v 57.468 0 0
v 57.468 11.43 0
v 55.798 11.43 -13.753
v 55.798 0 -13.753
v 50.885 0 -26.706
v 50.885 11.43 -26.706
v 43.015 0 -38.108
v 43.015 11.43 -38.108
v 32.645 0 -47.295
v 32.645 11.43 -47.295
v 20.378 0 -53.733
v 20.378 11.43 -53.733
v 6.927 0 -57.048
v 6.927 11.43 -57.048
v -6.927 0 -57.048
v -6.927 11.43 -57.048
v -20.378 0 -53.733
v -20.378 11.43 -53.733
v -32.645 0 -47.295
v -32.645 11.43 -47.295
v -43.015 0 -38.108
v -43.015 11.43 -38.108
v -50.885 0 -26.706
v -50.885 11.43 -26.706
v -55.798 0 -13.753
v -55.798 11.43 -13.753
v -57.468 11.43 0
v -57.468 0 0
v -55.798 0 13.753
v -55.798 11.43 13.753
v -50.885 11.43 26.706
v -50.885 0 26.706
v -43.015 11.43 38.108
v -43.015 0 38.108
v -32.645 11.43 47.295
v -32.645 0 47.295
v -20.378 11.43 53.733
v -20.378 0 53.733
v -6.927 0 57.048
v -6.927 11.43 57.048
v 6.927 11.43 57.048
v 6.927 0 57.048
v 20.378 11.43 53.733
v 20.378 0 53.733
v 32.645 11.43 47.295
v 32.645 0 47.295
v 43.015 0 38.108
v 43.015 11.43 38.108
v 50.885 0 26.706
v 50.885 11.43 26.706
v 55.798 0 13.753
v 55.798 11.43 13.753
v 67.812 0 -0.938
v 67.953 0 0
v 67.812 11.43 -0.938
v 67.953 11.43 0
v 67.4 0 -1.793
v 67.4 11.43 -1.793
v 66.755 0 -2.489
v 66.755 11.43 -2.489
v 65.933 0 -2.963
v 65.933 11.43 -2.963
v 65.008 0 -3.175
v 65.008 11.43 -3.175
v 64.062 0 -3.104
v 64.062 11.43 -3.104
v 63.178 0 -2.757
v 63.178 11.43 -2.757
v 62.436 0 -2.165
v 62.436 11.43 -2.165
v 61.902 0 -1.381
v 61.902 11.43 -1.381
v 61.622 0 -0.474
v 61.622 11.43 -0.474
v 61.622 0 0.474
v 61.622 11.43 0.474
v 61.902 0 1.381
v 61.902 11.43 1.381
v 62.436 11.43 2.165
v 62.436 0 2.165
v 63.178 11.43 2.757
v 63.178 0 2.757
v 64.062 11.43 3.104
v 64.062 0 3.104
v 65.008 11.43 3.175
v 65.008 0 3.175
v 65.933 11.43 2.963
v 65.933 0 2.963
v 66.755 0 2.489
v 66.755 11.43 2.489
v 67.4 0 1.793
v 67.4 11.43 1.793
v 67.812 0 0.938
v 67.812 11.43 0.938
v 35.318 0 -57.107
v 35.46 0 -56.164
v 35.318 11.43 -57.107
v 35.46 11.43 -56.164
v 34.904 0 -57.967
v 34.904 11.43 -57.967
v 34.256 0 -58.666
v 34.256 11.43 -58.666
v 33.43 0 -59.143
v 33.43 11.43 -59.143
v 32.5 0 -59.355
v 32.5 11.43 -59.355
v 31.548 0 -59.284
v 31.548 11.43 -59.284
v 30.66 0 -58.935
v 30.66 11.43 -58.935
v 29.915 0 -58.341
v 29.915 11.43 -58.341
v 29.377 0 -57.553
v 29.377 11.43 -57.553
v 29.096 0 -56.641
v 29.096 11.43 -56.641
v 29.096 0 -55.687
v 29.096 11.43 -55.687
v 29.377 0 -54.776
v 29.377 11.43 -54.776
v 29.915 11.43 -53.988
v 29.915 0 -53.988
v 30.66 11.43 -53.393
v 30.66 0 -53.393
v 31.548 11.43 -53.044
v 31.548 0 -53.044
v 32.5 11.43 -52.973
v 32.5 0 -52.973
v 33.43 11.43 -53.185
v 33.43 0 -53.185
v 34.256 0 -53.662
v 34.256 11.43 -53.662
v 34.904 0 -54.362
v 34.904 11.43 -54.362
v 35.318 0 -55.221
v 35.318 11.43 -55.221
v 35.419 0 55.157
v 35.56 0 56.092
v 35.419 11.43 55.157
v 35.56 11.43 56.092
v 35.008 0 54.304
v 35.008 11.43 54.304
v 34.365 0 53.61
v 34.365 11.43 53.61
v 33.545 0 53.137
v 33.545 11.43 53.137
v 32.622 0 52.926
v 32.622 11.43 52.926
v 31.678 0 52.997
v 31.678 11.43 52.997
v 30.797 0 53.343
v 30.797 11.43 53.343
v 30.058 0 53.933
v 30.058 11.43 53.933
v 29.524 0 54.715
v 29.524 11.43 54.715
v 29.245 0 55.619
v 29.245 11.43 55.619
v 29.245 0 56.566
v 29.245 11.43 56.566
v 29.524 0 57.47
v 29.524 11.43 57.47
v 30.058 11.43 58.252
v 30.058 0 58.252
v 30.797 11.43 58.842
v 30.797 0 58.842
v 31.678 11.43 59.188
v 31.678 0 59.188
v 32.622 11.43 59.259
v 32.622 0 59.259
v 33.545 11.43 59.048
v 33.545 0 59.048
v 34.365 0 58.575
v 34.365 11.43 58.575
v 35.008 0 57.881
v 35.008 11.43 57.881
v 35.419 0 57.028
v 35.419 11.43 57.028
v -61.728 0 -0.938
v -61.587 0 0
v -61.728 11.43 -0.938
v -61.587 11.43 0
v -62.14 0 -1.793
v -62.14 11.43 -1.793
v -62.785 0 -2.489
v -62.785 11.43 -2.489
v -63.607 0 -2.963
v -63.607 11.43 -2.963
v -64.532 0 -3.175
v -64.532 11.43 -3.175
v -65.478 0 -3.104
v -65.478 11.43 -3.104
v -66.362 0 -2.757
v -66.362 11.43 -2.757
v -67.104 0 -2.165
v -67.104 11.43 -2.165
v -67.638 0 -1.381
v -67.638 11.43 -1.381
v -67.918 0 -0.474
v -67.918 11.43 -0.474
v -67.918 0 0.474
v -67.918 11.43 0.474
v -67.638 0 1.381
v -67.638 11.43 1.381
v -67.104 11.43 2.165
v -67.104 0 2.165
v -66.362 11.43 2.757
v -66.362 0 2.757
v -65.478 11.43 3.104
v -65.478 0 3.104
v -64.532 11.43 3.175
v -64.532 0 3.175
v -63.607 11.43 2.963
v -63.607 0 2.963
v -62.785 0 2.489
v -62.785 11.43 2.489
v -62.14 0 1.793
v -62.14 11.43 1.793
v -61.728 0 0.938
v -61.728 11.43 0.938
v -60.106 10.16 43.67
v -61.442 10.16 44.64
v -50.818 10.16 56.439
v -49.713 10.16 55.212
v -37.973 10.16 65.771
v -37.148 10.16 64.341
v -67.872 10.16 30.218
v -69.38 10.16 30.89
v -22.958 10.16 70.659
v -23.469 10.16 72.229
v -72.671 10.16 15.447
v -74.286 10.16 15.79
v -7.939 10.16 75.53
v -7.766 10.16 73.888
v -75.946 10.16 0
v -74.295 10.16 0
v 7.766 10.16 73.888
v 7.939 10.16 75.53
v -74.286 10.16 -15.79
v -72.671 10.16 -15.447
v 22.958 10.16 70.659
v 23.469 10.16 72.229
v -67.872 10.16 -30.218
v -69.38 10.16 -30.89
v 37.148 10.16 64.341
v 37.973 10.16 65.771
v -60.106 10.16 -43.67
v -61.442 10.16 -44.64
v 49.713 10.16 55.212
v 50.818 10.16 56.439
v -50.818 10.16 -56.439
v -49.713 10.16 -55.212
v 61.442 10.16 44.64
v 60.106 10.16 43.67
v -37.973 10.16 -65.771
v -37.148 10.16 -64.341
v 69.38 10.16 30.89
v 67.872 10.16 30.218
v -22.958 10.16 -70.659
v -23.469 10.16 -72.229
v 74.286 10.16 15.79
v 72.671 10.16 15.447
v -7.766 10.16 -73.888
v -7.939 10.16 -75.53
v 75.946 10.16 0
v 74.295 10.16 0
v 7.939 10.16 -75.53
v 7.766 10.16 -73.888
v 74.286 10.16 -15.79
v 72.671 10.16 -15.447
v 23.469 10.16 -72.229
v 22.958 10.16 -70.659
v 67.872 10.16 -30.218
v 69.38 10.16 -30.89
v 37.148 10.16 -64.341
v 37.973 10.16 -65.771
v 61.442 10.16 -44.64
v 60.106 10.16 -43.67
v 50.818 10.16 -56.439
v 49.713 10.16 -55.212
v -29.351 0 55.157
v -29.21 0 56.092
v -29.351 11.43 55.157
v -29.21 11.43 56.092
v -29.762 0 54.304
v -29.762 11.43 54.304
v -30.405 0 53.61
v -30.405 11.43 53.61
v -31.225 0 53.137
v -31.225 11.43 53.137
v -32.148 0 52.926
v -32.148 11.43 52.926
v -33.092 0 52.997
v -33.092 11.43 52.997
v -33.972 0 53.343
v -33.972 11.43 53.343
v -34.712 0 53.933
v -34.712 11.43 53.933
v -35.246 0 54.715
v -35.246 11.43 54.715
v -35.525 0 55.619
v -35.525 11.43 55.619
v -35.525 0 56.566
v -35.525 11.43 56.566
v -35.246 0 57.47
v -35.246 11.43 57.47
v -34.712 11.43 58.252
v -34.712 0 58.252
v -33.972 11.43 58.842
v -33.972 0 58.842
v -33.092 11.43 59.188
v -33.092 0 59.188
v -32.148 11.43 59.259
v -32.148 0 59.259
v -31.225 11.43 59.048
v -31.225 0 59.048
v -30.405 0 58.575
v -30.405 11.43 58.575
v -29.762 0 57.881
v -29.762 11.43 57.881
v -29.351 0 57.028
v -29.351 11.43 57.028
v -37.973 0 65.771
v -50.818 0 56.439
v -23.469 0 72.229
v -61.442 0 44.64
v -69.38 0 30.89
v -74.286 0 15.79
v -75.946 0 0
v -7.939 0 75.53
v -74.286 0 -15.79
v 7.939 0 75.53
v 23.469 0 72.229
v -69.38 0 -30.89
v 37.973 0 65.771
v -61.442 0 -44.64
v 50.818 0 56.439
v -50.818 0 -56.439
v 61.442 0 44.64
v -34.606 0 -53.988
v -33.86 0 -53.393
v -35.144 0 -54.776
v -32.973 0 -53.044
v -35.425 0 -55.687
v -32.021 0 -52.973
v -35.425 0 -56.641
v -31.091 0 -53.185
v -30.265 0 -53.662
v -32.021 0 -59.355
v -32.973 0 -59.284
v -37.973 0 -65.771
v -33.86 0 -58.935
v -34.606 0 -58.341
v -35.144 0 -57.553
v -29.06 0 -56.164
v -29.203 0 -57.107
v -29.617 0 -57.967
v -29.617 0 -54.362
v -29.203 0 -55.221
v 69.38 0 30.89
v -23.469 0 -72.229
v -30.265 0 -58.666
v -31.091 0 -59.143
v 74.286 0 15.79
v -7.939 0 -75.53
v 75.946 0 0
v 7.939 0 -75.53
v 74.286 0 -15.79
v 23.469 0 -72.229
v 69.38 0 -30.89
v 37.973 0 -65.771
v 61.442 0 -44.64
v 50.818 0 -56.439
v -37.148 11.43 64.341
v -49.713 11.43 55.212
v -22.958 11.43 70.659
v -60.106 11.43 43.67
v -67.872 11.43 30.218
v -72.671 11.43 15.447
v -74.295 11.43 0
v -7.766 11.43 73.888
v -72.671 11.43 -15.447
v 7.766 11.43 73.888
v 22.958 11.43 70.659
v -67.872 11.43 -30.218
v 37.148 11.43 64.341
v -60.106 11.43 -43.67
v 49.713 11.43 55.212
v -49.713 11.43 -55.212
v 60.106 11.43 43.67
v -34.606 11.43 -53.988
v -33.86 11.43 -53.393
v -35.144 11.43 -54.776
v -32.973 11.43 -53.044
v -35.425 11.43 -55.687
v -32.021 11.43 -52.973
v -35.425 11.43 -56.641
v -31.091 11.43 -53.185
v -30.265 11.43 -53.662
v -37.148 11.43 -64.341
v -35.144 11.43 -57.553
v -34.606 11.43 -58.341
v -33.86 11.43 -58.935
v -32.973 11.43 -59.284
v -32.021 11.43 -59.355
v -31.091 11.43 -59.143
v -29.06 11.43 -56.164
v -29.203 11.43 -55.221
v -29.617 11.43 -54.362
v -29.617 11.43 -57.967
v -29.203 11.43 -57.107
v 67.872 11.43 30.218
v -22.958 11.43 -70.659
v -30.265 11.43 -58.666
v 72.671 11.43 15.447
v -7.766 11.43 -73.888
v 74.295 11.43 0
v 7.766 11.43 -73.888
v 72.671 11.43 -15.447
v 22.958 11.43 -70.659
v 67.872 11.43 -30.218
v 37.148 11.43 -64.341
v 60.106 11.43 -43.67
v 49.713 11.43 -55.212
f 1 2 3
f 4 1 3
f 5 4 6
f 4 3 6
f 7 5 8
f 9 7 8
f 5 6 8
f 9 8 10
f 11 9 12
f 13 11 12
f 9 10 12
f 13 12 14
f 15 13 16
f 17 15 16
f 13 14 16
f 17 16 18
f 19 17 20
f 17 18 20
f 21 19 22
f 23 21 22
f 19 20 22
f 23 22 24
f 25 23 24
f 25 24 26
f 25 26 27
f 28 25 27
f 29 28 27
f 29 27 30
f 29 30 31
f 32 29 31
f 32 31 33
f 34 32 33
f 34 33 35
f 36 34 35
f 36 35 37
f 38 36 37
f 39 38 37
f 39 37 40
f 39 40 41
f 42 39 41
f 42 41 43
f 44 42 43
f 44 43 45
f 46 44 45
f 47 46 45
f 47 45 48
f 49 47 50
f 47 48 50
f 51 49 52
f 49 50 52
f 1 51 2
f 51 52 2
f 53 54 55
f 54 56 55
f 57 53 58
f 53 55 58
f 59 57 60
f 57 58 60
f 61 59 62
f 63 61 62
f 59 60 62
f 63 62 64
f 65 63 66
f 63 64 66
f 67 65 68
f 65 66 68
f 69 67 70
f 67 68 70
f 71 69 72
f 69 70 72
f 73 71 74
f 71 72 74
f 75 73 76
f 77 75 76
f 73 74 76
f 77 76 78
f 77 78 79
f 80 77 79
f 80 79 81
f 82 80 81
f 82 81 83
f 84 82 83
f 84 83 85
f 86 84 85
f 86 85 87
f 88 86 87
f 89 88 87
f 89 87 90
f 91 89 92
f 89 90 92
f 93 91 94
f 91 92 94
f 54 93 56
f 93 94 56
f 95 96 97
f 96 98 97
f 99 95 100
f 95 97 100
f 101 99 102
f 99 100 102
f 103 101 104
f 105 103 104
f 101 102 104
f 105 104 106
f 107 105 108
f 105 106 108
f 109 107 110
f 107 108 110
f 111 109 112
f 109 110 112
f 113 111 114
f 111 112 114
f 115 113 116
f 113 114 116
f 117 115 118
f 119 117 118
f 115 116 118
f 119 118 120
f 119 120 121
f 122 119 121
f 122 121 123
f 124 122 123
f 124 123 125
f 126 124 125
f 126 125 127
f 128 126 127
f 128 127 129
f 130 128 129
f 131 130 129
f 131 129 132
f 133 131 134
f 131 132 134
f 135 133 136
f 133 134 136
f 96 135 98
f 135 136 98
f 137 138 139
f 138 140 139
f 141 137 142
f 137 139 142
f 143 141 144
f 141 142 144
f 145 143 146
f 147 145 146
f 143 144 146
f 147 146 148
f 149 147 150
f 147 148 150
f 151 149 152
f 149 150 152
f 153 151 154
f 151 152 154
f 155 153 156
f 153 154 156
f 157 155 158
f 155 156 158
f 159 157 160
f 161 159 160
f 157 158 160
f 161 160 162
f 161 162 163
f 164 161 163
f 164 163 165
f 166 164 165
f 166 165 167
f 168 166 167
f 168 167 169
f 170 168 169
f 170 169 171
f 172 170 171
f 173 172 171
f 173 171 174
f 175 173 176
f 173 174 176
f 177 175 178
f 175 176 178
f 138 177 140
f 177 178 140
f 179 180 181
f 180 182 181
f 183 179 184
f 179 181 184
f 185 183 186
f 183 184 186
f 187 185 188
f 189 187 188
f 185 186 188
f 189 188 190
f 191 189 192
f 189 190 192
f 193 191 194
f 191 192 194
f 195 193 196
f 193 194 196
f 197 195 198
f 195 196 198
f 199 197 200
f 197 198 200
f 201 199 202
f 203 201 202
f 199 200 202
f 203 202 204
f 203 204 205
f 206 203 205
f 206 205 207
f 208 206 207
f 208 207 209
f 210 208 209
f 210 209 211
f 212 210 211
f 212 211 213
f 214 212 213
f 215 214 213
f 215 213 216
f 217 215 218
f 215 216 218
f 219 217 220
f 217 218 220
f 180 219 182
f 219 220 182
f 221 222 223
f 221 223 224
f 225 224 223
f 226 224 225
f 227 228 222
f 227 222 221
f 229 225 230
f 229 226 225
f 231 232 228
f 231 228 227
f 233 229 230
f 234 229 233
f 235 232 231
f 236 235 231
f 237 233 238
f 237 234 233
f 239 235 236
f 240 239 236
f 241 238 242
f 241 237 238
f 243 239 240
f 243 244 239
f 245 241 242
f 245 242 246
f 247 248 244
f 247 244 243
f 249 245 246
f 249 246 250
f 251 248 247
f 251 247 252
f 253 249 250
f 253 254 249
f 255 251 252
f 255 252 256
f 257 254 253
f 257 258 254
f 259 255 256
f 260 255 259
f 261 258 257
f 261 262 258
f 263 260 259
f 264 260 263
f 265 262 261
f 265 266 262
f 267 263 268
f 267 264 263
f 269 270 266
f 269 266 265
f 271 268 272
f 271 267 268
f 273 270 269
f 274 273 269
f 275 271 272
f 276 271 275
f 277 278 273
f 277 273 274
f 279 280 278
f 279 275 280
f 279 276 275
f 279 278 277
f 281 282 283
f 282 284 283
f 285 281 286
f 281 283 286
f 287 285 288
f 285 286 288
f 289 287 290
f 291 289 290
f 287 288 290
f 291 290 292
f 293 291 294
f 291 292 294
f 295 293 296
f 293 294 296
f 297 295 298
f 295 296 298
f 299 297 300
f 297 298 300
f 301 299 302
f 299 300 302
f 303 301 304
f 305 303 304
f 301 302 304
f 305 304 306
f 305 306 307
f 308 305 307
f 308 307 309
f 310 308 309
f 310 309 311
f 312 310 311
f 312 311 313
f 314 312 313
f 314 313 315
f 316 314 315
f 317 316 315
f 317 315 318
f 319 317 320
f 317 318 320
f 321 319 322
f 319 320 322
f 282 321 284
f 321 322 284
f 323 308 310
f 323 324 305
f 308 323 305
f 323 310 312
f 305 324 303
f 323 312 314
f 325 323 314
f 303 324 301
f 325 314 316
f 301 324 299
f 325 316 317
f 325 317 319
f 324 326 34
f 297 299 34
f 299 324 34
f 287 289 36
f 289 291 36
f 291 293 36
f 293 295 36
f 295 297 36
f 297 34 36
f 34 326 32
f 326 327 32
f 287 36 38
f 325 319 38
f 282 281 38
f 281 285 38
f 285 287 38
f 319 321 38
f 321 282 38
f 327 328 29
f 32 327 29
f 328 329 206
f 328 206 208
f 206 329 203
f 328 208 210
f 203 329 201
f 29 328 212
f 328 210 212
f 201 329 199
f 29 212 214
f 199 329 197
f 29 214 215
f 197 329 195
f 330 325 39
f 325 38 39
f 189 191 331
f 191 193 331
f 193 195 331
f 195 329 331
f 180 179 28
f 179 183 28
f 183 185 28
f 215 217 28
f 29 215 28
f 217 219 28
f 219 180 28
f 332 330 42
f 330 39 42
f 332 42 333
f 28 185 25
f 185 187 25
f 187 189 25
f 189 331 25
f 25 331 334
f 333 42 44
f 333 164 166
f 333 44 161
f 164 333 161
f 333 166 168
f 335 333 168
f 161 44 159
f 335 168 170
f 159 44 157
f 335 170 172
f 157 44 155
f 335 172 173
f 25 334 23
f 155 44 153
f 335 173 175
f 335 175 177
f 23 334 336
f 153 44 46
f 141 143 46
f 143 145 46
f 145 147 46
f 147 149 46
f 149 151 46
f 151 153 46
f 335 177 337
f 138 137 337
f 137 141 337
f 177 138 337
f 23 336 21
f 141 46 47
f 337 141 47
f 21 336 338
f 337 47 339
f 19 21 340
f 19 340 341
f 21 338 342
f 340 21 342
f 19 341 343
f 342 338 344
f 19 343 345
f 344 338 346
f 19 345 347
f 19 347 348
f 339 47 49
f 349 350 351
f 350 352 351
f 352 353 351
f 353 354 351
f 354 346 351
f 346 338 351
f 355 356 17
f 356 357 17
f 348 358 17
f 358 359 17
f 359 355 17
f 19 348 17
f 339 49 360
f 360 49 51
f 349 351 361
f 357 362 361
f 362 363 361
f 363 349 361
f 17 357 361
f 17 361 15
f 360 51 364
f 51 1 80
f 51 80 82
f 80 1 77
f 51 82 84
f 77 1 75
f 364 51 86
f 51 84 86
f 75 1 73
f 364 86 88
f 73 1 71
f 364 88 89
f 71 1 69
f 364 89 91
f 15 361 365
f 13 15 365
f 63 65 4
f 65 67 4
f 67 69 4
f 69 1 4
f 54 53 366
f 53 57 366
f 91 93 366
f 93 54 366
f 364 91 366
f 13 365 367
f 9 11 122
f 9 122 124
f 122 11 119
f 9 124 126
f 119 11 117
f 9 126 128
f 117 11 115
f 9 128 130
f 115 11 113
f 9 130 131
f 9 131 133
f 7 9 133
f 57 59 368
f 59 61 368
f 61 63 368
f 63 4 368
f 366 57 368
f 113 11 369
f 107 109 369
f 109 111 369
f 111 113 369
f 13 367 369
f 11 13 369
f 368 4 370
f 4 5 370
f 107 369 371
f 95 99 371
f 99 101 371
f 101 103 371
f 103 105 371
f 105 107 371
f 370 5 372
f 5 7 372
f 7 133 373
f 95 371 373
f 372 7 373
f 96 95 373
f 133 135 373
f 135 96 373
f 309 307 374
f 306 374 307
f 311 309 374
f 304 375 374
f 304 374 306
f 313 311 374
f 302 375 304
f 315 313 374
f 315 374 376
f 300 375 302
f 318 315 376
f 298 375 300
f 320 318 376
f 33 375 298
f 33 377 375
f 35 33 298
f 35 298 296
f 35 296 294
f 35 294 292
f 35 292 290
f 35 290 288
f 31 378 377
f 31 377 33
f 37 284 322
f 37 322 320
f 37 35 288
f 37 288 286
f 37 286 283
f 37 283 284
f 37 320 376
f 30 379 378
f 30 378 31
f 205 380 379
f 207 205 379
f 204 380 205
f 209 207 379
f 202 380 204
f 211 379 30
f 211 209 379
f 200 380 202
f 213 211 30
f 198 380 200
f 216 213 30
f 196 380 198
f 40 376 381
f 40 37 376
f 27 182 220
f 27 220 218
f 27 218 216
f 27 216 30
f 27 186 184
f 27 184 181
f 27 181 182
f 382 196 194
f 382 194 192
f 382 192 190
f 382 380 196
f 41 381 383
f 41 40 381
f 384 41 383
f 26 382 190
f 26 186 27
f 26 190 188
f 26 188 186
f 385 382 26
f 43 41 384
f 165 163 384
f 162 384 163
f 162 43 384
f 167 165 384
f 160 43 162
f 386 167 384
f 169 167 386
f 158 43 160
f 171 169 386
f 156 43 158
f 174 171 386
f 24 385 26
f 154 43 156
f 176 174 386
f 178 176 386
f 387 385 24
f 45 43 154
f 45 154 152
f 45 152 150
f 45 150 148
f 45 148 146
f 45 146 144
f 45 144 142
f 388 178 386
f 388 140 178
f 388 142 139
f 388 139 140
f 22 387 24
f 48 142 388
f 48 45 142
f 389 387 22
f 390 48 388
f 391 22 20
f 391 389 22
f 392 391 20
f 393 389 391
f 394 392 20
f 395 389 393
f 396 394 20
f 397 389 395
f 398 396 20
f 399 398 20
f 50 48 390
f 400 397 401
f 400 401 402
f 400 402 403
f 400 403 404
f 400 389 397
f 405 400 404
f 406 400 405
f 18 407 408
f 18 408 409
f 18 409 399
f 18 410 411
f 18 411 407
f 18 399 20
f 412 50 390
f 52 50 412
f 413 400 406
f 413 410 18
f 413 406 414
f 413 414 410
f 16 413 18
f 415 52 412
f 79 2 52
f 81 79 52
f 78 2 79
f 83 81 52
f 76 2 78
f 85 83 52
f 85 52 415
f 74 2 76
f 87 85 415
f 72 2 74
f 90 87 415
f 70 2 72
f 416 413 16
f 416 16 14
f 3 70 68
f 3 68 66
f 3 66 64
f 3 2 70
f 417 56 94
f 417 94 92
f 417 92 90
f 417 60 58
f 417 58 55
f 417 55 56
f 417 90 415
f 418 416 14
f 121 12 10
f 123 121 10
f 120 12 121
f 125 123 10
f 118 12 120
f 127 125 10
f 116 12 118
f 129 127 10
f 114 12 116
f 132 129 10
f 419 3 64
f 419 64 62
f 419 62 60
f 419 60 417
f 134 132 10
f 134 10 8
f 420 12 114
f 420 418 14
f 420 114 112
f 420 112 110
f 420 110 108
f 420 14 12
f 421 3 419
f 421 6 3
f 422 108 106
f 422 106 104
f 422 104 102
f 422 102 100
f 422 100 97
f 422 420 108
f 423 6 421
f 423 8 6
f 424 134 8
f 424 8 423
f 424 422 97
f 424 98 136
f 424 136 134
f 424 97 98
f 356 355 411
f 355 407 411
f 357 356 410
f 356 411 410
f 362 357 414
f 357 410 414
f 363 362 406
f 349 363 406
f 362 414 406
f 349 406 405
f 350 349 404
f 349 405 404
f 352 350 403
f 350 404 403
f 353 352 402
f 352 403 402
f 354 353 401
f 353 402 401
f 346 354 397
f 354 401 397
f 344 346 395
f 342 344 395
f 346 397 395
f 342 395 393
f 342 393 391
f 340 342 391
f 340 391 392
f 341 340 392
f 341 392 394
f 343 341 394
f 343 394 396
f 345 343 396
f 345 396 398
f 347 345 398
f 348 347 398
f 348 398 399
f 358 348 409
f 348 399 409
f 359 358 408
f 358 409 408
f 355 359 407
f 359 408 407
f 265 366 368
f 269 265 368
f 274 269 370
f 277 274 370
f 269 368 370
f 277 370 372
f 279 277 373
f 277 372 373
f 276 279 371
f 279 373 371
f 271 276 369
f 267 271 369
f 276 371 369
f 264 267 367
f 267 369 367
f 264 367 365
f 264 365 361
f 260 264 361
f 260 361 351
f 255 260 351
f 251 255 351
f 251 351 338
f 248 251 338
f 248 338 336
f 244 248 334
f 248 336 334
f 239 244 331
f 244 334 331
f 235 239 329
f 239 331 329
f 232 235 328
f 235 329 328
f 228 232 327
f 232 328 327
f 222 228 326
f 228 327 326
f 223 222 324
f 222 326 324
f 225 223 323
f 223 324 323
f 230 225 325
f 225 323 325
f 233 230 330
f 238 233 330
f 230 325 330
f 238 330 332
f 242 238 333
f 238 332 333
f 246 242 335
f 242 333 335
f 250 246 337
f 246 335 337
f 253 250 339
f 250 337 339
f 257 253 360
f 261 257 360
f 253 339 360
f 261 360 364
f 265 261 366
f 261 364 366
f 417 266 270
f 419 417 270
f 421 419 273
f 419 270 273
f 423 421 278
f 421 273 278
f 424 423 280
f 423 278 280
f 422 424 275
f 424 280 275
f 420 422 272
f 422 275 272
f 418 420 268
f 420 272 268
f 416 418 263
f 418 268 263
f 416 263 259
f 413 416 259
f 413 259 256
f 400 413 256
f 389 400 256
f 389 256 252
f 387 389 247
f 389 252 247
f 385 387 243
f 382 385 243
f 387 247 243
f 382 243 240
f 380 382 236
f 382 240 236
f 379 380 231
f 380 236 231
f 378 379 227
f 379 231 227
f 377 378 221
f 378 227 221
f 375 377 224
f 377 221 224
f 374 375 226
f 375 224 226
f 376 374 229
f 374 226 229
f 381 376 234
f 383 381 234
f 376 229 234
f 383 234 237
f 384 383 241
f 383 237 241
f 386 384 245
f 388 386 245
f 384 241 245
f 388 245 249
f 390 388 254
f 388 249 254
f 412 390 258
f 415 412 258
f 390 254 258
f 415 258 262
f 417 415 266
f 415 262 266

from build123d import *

# Parameters (mm, degrees)
SKETCH1_R               = 75.946
BOSS_EXTRUDE1_DEPTH     = 10.16
SKETCH7_R               = 74.295
BOSS_EXTRUDE2_DEPTH     = 1.27
SKETCH6_R               = 3.183478234
SKETCH6_R_2             = 3.2
SKETCH6_R_3             = 3.175
CUT_EXTRUDE5_DEPTH      = 2.27
CUT_EXTRUDE5_DEPTH_BACK = 11.16
SKETCH9_R               = 57.4675
CUT_EXTRUDE7_DEPTH      = 12.43


with BuildPart() as part:
    # Sketch1 → Boss-Extrude1 (new body)
    with BuildSketch(Plane(origin=(0, 0, 0), x_dir=(1, 0, 0), z_dir=(0, 1, 0))):
        Circle(SKETCH1_R)
    extrude(amount=BOSS_EXTRUDE1_DEPTH)

    # Sketch7 → Boss-Extrude2 (add)
    with BuildSketch(Plane(origin=(0, 10.16, 0), x_dir=(1, 0, 0), z_dir=(0, 1, 0))):
        Circle(SKETCH7_R)
    extrude(amount=BOSS_EXTRUDE2_DEPTH)

    # Sketch6 → Cut-Extrude5 (cut, two sides)
    with BuildSketch(Plane(origin=(0, 10.16, 0), x_dir=(1, 0, 0), z_dir=(0, 1, 0))) as cut_extrude5_sk:
        with Locations((-64.77, 0)):
            Circle(SKETCH6_R)
        with Locations((-32.260478415, 56.164173923)):
            Circle(SKETCH6_R_2)
        with Locations((-32.385, -56.092465403)):
            Circle(SKETCH6_R_3)
        with Locations((32.385, -56.092465403)):
            Circle(SKETCH6_R_3)
        with Locations((64.77, 0)):
            Circle(SKETCH6_R)
        with Locations((32.260478415, 56.164173923)):
            Circle(SKETCH6_R_2)
    extrude(amount=CUT_EXTRUDE5_DEPTH, mode=Mode.SUBTRACT)
    extrude(cut_extrude5_sk.sketch, amount=-CUT_EXTRUDE5_DEPTH_BACK, mode=Mode.SUBTRACT)

    # Sketch9 → Cut-Extrude7 (cut, through all)
    with BuildSketch(Plane(origin=(0, 11.43, 0), x_dir=(1, 0, 0), z_dir=(0, 1, 0))):
        Circle(SKETCH9_R)
    extrude(amount=-CUT_EXTRUDE7_DEPTH, mode=Mode.SUBTRACT)


solid = part.part
